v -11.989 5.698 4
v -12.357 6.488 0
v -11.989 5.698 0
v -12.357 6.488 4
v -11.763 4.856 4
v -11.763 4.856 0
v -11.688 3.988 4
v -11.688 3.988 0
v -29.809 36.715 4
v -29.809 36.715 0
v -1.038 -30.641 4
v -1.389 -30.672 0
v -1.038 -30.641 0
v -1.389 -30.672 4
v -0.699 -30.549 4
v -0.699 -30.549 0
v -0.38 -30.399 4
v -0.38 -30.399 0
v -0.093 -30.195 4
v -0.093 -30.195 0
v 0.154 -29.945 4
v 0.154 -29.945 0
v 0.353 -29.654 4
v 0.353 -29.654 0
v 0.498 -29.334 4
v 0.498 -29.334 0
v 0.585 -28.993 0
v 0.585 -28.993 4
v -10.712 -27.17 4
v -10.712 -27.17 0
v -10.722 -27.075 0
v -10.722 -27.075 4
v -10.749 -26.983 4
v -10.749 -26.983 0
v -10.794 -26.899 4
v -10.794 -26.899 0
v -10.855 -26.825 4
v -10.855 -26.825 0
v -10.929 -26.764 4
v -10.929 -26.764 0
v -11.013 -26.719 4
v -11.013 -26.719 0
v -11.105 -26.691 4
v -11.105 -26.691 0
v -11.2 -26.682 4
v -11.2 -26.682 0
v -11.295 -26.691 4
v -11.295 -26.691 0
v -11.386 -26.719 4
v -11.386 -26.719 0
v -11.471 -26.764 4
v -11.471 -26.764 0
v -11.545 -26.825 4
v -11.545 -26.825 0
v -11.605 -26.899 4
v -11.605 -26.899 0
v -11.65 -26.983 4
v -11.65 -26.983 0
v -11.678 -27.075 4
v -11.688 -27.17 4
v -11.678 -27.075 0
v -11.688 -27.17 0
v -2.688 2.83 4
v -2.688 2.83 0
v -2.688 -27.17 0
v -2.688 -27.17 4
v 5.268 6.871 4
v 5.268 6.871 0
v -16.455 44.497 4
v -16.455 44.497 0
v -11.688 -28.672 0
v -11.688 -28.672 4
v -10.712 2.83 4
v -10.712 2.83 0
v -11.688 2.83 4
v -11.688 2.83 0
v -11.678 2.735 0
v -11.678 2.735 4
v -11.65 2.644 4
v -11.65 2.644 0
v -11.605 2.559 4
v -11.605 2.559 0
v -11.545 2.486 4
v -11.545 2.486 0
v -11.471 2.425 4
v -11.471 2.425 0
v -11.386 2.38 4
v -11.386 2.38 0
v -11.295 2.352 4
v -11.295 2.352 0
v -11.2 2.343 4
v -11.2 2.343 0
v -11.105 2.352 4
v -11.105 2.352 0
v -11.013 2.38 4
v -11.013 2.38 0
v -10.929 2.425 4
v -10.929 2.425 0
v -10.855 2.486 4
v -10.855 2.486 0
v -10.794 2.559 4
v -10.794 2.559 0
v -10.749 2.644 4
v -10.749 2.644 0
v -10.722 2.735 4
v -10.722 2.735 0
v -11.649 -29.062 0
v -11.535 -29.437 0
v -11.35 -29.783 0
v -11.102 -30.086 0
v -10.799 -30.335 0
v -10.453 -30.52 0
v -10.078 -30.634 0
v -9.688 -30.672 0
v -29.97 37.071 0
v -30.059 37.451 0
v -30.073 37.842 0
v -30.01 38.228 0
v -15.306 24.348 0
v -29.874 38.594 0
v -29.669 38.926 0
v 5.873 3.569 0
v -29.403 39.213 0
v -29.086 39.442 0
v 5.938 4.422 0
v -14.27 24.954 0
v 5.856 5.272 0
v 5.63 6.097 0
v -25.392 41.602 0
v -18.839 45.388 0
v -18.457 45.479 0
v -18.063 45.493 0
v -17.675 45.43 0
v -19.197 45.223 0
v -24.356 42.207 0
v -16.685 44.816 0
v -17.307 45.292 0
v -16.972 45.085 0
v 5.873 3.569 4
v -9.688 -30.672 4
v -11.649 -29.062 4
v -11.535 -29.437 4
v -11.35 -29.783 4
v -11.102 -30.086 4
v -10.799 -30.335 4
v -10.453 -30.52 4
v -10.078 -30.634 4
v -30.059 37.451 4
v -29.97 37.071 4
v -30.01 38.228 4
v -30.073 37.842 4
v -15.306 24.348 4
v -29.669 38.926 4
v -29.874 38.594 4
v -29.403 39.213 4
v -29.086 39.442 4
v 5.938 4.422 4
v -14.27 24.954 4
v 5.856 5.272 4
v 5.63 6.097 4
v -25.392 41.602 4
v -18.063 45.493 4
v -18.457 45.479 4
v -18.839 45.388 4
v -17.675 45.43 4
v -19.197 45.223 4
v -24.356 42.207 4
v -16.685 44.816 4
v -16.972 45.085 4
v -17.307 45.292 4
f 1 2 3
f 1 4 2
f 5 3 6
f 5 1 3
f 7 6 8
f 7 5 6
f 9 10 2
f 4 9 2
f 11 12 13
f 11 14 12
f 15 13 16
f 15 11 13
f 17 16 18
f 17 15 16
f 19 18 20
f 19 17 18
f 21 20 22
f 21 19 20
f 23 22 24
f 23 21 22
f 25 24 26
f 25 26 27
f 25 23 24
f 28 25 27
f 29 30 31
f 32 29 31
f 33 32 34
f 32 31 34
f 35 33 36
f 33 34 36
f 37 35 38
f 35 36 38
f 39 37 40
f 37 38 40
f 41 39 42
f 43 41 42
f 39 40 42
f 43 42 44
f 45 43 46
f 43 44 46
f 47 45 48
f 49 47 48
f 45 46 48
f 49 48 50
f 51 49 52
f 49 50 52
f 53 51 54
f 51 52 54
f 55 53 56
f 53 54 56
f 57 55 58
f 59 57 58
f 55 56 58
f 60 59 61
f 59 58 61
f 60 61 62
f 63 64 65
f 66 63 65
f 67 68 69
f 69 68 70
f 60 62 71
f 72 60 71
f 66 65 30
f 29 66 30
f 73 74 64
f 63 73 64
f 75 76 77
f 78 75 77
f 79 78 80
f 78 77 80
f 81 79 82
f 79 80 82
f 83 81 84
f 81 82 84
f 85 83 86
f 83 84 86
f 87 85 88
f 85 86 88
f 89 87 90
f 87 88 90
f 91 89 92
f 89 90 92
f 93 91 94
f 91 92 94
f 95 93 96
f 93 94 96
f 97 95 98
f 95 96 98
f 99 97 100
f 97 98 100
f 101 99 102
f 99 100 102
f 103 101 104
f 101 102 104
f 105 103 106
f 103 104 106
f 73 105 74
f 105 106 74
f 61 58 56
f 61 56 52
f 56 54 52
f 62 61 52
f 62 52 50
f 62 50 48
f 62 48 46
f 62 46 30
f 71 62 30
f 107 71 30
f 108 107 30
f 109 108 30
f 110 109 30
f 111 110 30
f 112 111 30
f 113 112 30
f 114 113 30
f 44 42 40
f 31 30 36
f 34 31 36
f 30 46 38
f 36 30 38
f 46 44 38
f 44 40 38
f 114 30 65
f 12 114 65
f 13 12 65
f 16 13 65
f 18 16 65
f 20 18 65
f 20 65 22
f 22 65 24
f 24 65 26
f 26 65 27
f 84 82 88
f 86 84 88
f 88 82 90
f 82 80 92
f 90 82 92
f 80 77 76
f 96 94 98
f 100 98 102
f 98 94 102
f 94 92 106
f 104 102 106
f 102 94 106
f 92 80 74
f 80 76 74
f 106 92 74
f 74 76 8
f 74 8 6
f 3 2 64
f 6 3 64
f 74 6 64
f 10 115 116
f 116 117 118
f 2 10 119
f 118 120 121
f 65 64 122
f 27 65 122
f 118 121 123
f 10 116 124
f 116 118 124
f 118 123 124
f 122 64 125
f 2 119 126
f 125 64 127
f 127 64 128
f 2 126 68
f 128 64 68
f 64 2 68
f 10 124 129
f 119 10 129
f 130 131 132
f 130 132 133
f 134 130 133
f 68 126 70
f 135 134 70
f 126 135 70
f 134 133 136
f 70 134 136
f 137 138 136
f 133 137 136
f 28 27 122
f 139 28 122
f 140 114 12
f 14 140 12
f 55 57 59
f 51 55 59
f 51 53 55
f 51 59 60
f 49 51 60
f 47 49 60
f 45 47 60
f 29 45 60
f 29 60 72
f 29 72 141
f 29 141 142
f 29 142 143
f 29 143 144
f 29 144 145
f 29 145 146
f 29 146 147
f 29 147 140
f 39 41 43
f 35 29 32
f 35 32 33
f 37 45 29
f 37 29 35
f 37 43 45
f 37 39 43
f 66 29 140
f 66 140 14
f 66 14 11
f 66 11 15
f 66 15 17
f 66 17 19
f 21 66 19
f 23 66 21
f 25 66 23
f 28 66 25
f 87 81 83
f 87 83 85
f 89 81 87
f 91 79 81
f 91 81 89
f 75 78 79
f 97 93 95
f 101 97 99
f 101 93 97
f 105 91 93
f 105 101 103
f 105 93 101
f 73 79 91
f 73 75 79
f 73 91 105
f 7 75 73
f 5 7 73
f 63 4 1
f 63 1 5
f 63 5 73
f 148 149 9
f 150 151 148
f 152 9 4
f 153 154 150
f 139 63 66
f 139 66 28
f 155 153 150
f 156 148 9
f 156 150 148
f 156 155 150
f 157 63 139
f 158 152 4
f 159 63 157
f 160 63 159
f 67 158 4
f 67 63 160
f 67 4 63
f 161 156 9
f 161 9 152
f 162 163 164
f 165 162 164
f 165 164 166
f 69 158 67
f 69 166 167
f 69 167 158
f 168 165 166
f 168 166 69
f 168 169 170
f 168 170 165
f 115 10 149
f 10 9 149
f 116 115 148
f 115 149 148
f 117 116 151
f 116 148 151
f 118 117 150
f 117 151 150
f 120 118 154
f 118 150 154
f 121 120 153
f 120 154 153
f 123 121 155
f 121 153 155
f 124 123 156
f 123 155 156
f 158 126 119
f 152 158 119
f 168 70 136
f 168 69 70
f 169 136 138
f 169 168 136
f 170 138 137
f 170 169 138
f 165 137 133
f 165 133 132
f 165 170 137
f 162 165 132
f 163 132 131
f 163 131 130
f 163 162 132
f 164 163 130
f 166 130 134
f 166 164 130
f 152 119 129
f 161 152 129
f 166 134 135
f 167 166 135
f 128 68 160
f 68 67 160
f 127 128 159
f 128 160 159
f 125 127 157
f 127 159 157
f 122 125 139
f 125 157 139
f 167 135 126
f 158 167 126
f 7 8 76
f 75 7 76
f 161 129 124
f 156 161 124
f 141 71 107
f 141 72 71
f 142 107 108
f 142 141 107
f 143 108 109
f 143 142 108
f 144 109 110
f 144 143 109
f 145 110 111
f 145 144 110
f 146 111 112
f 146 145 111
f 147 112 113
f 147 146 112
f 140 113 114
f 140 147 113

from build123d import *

# Parameters (mm, degrees)
F1_DEPTH = 4
F2_R     = 2
F3_R     = 5


with BuildPart() as f1:
    # F0 (on Top) → F1 (new body)
    with BuildSketch(Plane.XY):
        with BuildLine():
            Line((-30.803579, 38.437911), (-11.687509, 5.327906))
            Line((-11.687509, 5.327906), (-11.687509, 2.830331))
            ThreePointArc((-11.687509, 2.830331), (-11.199892, 2.342714), (-10.712276, 2.830331))
            Line((-10.712276, 2.830331), (-2.687509, 2.830331))
            Line((-2.687509, 2.830331), (-2.687509, -27.169669))
            Line((-2.687509, -27.169669), (-10.712276, -27.169669))
            ThreePointArc((-10.712276, -27.169669), (-11.199892, -26.682053), (-11.687509, -27.169669))
            Line((-11.687509, -27.169669), (-11.687509, -30.672094))
            Line((-11.687509, -30.672094), (0.312491, -30.672094))
            Line((0.312491, -30.672094), (6.158749, 5.327906))
            Line((6.158749, 5.327906), (-17.460834, 46.238223))
            Line((-17.460834, 46.238223), (-24.356114, 42.207168))
            Line((-24.356114, 42.207168), (-14.269803, 24.954133))
            Line((-14.269803, 24.954133), (-15.305761, 24.3485))
            Line((-15.305761, 24.3485), (-25.392072, 41.601536))
            Line((-25.392072, 41.601536), (-30.803579, 38.437911))
        make_face()
    extrude(amount=F1_DEPTH)

    # F2
    f2_edges = [f1.edges().sort_by_distance(p)[0] for p in [
        (0.312491, -30.672094, 2),
        (-11.687509, -30.672094, 2),
        (-17.460834, 46.238223, 2),
        (-30.803579, 38.437911, 2),
    ]]
    fillet(f2_edges, radius=F2_R)

    # F3
    f3_edges = [f1.edges().sort_by_distance(p)[0] for p in [
        (6.158749, 5.327906, 2),
        (-11.687509, 5.327906, 2),
    ]]
    fillet(f3_edges, radius=F3_R)


solid = f1.part
